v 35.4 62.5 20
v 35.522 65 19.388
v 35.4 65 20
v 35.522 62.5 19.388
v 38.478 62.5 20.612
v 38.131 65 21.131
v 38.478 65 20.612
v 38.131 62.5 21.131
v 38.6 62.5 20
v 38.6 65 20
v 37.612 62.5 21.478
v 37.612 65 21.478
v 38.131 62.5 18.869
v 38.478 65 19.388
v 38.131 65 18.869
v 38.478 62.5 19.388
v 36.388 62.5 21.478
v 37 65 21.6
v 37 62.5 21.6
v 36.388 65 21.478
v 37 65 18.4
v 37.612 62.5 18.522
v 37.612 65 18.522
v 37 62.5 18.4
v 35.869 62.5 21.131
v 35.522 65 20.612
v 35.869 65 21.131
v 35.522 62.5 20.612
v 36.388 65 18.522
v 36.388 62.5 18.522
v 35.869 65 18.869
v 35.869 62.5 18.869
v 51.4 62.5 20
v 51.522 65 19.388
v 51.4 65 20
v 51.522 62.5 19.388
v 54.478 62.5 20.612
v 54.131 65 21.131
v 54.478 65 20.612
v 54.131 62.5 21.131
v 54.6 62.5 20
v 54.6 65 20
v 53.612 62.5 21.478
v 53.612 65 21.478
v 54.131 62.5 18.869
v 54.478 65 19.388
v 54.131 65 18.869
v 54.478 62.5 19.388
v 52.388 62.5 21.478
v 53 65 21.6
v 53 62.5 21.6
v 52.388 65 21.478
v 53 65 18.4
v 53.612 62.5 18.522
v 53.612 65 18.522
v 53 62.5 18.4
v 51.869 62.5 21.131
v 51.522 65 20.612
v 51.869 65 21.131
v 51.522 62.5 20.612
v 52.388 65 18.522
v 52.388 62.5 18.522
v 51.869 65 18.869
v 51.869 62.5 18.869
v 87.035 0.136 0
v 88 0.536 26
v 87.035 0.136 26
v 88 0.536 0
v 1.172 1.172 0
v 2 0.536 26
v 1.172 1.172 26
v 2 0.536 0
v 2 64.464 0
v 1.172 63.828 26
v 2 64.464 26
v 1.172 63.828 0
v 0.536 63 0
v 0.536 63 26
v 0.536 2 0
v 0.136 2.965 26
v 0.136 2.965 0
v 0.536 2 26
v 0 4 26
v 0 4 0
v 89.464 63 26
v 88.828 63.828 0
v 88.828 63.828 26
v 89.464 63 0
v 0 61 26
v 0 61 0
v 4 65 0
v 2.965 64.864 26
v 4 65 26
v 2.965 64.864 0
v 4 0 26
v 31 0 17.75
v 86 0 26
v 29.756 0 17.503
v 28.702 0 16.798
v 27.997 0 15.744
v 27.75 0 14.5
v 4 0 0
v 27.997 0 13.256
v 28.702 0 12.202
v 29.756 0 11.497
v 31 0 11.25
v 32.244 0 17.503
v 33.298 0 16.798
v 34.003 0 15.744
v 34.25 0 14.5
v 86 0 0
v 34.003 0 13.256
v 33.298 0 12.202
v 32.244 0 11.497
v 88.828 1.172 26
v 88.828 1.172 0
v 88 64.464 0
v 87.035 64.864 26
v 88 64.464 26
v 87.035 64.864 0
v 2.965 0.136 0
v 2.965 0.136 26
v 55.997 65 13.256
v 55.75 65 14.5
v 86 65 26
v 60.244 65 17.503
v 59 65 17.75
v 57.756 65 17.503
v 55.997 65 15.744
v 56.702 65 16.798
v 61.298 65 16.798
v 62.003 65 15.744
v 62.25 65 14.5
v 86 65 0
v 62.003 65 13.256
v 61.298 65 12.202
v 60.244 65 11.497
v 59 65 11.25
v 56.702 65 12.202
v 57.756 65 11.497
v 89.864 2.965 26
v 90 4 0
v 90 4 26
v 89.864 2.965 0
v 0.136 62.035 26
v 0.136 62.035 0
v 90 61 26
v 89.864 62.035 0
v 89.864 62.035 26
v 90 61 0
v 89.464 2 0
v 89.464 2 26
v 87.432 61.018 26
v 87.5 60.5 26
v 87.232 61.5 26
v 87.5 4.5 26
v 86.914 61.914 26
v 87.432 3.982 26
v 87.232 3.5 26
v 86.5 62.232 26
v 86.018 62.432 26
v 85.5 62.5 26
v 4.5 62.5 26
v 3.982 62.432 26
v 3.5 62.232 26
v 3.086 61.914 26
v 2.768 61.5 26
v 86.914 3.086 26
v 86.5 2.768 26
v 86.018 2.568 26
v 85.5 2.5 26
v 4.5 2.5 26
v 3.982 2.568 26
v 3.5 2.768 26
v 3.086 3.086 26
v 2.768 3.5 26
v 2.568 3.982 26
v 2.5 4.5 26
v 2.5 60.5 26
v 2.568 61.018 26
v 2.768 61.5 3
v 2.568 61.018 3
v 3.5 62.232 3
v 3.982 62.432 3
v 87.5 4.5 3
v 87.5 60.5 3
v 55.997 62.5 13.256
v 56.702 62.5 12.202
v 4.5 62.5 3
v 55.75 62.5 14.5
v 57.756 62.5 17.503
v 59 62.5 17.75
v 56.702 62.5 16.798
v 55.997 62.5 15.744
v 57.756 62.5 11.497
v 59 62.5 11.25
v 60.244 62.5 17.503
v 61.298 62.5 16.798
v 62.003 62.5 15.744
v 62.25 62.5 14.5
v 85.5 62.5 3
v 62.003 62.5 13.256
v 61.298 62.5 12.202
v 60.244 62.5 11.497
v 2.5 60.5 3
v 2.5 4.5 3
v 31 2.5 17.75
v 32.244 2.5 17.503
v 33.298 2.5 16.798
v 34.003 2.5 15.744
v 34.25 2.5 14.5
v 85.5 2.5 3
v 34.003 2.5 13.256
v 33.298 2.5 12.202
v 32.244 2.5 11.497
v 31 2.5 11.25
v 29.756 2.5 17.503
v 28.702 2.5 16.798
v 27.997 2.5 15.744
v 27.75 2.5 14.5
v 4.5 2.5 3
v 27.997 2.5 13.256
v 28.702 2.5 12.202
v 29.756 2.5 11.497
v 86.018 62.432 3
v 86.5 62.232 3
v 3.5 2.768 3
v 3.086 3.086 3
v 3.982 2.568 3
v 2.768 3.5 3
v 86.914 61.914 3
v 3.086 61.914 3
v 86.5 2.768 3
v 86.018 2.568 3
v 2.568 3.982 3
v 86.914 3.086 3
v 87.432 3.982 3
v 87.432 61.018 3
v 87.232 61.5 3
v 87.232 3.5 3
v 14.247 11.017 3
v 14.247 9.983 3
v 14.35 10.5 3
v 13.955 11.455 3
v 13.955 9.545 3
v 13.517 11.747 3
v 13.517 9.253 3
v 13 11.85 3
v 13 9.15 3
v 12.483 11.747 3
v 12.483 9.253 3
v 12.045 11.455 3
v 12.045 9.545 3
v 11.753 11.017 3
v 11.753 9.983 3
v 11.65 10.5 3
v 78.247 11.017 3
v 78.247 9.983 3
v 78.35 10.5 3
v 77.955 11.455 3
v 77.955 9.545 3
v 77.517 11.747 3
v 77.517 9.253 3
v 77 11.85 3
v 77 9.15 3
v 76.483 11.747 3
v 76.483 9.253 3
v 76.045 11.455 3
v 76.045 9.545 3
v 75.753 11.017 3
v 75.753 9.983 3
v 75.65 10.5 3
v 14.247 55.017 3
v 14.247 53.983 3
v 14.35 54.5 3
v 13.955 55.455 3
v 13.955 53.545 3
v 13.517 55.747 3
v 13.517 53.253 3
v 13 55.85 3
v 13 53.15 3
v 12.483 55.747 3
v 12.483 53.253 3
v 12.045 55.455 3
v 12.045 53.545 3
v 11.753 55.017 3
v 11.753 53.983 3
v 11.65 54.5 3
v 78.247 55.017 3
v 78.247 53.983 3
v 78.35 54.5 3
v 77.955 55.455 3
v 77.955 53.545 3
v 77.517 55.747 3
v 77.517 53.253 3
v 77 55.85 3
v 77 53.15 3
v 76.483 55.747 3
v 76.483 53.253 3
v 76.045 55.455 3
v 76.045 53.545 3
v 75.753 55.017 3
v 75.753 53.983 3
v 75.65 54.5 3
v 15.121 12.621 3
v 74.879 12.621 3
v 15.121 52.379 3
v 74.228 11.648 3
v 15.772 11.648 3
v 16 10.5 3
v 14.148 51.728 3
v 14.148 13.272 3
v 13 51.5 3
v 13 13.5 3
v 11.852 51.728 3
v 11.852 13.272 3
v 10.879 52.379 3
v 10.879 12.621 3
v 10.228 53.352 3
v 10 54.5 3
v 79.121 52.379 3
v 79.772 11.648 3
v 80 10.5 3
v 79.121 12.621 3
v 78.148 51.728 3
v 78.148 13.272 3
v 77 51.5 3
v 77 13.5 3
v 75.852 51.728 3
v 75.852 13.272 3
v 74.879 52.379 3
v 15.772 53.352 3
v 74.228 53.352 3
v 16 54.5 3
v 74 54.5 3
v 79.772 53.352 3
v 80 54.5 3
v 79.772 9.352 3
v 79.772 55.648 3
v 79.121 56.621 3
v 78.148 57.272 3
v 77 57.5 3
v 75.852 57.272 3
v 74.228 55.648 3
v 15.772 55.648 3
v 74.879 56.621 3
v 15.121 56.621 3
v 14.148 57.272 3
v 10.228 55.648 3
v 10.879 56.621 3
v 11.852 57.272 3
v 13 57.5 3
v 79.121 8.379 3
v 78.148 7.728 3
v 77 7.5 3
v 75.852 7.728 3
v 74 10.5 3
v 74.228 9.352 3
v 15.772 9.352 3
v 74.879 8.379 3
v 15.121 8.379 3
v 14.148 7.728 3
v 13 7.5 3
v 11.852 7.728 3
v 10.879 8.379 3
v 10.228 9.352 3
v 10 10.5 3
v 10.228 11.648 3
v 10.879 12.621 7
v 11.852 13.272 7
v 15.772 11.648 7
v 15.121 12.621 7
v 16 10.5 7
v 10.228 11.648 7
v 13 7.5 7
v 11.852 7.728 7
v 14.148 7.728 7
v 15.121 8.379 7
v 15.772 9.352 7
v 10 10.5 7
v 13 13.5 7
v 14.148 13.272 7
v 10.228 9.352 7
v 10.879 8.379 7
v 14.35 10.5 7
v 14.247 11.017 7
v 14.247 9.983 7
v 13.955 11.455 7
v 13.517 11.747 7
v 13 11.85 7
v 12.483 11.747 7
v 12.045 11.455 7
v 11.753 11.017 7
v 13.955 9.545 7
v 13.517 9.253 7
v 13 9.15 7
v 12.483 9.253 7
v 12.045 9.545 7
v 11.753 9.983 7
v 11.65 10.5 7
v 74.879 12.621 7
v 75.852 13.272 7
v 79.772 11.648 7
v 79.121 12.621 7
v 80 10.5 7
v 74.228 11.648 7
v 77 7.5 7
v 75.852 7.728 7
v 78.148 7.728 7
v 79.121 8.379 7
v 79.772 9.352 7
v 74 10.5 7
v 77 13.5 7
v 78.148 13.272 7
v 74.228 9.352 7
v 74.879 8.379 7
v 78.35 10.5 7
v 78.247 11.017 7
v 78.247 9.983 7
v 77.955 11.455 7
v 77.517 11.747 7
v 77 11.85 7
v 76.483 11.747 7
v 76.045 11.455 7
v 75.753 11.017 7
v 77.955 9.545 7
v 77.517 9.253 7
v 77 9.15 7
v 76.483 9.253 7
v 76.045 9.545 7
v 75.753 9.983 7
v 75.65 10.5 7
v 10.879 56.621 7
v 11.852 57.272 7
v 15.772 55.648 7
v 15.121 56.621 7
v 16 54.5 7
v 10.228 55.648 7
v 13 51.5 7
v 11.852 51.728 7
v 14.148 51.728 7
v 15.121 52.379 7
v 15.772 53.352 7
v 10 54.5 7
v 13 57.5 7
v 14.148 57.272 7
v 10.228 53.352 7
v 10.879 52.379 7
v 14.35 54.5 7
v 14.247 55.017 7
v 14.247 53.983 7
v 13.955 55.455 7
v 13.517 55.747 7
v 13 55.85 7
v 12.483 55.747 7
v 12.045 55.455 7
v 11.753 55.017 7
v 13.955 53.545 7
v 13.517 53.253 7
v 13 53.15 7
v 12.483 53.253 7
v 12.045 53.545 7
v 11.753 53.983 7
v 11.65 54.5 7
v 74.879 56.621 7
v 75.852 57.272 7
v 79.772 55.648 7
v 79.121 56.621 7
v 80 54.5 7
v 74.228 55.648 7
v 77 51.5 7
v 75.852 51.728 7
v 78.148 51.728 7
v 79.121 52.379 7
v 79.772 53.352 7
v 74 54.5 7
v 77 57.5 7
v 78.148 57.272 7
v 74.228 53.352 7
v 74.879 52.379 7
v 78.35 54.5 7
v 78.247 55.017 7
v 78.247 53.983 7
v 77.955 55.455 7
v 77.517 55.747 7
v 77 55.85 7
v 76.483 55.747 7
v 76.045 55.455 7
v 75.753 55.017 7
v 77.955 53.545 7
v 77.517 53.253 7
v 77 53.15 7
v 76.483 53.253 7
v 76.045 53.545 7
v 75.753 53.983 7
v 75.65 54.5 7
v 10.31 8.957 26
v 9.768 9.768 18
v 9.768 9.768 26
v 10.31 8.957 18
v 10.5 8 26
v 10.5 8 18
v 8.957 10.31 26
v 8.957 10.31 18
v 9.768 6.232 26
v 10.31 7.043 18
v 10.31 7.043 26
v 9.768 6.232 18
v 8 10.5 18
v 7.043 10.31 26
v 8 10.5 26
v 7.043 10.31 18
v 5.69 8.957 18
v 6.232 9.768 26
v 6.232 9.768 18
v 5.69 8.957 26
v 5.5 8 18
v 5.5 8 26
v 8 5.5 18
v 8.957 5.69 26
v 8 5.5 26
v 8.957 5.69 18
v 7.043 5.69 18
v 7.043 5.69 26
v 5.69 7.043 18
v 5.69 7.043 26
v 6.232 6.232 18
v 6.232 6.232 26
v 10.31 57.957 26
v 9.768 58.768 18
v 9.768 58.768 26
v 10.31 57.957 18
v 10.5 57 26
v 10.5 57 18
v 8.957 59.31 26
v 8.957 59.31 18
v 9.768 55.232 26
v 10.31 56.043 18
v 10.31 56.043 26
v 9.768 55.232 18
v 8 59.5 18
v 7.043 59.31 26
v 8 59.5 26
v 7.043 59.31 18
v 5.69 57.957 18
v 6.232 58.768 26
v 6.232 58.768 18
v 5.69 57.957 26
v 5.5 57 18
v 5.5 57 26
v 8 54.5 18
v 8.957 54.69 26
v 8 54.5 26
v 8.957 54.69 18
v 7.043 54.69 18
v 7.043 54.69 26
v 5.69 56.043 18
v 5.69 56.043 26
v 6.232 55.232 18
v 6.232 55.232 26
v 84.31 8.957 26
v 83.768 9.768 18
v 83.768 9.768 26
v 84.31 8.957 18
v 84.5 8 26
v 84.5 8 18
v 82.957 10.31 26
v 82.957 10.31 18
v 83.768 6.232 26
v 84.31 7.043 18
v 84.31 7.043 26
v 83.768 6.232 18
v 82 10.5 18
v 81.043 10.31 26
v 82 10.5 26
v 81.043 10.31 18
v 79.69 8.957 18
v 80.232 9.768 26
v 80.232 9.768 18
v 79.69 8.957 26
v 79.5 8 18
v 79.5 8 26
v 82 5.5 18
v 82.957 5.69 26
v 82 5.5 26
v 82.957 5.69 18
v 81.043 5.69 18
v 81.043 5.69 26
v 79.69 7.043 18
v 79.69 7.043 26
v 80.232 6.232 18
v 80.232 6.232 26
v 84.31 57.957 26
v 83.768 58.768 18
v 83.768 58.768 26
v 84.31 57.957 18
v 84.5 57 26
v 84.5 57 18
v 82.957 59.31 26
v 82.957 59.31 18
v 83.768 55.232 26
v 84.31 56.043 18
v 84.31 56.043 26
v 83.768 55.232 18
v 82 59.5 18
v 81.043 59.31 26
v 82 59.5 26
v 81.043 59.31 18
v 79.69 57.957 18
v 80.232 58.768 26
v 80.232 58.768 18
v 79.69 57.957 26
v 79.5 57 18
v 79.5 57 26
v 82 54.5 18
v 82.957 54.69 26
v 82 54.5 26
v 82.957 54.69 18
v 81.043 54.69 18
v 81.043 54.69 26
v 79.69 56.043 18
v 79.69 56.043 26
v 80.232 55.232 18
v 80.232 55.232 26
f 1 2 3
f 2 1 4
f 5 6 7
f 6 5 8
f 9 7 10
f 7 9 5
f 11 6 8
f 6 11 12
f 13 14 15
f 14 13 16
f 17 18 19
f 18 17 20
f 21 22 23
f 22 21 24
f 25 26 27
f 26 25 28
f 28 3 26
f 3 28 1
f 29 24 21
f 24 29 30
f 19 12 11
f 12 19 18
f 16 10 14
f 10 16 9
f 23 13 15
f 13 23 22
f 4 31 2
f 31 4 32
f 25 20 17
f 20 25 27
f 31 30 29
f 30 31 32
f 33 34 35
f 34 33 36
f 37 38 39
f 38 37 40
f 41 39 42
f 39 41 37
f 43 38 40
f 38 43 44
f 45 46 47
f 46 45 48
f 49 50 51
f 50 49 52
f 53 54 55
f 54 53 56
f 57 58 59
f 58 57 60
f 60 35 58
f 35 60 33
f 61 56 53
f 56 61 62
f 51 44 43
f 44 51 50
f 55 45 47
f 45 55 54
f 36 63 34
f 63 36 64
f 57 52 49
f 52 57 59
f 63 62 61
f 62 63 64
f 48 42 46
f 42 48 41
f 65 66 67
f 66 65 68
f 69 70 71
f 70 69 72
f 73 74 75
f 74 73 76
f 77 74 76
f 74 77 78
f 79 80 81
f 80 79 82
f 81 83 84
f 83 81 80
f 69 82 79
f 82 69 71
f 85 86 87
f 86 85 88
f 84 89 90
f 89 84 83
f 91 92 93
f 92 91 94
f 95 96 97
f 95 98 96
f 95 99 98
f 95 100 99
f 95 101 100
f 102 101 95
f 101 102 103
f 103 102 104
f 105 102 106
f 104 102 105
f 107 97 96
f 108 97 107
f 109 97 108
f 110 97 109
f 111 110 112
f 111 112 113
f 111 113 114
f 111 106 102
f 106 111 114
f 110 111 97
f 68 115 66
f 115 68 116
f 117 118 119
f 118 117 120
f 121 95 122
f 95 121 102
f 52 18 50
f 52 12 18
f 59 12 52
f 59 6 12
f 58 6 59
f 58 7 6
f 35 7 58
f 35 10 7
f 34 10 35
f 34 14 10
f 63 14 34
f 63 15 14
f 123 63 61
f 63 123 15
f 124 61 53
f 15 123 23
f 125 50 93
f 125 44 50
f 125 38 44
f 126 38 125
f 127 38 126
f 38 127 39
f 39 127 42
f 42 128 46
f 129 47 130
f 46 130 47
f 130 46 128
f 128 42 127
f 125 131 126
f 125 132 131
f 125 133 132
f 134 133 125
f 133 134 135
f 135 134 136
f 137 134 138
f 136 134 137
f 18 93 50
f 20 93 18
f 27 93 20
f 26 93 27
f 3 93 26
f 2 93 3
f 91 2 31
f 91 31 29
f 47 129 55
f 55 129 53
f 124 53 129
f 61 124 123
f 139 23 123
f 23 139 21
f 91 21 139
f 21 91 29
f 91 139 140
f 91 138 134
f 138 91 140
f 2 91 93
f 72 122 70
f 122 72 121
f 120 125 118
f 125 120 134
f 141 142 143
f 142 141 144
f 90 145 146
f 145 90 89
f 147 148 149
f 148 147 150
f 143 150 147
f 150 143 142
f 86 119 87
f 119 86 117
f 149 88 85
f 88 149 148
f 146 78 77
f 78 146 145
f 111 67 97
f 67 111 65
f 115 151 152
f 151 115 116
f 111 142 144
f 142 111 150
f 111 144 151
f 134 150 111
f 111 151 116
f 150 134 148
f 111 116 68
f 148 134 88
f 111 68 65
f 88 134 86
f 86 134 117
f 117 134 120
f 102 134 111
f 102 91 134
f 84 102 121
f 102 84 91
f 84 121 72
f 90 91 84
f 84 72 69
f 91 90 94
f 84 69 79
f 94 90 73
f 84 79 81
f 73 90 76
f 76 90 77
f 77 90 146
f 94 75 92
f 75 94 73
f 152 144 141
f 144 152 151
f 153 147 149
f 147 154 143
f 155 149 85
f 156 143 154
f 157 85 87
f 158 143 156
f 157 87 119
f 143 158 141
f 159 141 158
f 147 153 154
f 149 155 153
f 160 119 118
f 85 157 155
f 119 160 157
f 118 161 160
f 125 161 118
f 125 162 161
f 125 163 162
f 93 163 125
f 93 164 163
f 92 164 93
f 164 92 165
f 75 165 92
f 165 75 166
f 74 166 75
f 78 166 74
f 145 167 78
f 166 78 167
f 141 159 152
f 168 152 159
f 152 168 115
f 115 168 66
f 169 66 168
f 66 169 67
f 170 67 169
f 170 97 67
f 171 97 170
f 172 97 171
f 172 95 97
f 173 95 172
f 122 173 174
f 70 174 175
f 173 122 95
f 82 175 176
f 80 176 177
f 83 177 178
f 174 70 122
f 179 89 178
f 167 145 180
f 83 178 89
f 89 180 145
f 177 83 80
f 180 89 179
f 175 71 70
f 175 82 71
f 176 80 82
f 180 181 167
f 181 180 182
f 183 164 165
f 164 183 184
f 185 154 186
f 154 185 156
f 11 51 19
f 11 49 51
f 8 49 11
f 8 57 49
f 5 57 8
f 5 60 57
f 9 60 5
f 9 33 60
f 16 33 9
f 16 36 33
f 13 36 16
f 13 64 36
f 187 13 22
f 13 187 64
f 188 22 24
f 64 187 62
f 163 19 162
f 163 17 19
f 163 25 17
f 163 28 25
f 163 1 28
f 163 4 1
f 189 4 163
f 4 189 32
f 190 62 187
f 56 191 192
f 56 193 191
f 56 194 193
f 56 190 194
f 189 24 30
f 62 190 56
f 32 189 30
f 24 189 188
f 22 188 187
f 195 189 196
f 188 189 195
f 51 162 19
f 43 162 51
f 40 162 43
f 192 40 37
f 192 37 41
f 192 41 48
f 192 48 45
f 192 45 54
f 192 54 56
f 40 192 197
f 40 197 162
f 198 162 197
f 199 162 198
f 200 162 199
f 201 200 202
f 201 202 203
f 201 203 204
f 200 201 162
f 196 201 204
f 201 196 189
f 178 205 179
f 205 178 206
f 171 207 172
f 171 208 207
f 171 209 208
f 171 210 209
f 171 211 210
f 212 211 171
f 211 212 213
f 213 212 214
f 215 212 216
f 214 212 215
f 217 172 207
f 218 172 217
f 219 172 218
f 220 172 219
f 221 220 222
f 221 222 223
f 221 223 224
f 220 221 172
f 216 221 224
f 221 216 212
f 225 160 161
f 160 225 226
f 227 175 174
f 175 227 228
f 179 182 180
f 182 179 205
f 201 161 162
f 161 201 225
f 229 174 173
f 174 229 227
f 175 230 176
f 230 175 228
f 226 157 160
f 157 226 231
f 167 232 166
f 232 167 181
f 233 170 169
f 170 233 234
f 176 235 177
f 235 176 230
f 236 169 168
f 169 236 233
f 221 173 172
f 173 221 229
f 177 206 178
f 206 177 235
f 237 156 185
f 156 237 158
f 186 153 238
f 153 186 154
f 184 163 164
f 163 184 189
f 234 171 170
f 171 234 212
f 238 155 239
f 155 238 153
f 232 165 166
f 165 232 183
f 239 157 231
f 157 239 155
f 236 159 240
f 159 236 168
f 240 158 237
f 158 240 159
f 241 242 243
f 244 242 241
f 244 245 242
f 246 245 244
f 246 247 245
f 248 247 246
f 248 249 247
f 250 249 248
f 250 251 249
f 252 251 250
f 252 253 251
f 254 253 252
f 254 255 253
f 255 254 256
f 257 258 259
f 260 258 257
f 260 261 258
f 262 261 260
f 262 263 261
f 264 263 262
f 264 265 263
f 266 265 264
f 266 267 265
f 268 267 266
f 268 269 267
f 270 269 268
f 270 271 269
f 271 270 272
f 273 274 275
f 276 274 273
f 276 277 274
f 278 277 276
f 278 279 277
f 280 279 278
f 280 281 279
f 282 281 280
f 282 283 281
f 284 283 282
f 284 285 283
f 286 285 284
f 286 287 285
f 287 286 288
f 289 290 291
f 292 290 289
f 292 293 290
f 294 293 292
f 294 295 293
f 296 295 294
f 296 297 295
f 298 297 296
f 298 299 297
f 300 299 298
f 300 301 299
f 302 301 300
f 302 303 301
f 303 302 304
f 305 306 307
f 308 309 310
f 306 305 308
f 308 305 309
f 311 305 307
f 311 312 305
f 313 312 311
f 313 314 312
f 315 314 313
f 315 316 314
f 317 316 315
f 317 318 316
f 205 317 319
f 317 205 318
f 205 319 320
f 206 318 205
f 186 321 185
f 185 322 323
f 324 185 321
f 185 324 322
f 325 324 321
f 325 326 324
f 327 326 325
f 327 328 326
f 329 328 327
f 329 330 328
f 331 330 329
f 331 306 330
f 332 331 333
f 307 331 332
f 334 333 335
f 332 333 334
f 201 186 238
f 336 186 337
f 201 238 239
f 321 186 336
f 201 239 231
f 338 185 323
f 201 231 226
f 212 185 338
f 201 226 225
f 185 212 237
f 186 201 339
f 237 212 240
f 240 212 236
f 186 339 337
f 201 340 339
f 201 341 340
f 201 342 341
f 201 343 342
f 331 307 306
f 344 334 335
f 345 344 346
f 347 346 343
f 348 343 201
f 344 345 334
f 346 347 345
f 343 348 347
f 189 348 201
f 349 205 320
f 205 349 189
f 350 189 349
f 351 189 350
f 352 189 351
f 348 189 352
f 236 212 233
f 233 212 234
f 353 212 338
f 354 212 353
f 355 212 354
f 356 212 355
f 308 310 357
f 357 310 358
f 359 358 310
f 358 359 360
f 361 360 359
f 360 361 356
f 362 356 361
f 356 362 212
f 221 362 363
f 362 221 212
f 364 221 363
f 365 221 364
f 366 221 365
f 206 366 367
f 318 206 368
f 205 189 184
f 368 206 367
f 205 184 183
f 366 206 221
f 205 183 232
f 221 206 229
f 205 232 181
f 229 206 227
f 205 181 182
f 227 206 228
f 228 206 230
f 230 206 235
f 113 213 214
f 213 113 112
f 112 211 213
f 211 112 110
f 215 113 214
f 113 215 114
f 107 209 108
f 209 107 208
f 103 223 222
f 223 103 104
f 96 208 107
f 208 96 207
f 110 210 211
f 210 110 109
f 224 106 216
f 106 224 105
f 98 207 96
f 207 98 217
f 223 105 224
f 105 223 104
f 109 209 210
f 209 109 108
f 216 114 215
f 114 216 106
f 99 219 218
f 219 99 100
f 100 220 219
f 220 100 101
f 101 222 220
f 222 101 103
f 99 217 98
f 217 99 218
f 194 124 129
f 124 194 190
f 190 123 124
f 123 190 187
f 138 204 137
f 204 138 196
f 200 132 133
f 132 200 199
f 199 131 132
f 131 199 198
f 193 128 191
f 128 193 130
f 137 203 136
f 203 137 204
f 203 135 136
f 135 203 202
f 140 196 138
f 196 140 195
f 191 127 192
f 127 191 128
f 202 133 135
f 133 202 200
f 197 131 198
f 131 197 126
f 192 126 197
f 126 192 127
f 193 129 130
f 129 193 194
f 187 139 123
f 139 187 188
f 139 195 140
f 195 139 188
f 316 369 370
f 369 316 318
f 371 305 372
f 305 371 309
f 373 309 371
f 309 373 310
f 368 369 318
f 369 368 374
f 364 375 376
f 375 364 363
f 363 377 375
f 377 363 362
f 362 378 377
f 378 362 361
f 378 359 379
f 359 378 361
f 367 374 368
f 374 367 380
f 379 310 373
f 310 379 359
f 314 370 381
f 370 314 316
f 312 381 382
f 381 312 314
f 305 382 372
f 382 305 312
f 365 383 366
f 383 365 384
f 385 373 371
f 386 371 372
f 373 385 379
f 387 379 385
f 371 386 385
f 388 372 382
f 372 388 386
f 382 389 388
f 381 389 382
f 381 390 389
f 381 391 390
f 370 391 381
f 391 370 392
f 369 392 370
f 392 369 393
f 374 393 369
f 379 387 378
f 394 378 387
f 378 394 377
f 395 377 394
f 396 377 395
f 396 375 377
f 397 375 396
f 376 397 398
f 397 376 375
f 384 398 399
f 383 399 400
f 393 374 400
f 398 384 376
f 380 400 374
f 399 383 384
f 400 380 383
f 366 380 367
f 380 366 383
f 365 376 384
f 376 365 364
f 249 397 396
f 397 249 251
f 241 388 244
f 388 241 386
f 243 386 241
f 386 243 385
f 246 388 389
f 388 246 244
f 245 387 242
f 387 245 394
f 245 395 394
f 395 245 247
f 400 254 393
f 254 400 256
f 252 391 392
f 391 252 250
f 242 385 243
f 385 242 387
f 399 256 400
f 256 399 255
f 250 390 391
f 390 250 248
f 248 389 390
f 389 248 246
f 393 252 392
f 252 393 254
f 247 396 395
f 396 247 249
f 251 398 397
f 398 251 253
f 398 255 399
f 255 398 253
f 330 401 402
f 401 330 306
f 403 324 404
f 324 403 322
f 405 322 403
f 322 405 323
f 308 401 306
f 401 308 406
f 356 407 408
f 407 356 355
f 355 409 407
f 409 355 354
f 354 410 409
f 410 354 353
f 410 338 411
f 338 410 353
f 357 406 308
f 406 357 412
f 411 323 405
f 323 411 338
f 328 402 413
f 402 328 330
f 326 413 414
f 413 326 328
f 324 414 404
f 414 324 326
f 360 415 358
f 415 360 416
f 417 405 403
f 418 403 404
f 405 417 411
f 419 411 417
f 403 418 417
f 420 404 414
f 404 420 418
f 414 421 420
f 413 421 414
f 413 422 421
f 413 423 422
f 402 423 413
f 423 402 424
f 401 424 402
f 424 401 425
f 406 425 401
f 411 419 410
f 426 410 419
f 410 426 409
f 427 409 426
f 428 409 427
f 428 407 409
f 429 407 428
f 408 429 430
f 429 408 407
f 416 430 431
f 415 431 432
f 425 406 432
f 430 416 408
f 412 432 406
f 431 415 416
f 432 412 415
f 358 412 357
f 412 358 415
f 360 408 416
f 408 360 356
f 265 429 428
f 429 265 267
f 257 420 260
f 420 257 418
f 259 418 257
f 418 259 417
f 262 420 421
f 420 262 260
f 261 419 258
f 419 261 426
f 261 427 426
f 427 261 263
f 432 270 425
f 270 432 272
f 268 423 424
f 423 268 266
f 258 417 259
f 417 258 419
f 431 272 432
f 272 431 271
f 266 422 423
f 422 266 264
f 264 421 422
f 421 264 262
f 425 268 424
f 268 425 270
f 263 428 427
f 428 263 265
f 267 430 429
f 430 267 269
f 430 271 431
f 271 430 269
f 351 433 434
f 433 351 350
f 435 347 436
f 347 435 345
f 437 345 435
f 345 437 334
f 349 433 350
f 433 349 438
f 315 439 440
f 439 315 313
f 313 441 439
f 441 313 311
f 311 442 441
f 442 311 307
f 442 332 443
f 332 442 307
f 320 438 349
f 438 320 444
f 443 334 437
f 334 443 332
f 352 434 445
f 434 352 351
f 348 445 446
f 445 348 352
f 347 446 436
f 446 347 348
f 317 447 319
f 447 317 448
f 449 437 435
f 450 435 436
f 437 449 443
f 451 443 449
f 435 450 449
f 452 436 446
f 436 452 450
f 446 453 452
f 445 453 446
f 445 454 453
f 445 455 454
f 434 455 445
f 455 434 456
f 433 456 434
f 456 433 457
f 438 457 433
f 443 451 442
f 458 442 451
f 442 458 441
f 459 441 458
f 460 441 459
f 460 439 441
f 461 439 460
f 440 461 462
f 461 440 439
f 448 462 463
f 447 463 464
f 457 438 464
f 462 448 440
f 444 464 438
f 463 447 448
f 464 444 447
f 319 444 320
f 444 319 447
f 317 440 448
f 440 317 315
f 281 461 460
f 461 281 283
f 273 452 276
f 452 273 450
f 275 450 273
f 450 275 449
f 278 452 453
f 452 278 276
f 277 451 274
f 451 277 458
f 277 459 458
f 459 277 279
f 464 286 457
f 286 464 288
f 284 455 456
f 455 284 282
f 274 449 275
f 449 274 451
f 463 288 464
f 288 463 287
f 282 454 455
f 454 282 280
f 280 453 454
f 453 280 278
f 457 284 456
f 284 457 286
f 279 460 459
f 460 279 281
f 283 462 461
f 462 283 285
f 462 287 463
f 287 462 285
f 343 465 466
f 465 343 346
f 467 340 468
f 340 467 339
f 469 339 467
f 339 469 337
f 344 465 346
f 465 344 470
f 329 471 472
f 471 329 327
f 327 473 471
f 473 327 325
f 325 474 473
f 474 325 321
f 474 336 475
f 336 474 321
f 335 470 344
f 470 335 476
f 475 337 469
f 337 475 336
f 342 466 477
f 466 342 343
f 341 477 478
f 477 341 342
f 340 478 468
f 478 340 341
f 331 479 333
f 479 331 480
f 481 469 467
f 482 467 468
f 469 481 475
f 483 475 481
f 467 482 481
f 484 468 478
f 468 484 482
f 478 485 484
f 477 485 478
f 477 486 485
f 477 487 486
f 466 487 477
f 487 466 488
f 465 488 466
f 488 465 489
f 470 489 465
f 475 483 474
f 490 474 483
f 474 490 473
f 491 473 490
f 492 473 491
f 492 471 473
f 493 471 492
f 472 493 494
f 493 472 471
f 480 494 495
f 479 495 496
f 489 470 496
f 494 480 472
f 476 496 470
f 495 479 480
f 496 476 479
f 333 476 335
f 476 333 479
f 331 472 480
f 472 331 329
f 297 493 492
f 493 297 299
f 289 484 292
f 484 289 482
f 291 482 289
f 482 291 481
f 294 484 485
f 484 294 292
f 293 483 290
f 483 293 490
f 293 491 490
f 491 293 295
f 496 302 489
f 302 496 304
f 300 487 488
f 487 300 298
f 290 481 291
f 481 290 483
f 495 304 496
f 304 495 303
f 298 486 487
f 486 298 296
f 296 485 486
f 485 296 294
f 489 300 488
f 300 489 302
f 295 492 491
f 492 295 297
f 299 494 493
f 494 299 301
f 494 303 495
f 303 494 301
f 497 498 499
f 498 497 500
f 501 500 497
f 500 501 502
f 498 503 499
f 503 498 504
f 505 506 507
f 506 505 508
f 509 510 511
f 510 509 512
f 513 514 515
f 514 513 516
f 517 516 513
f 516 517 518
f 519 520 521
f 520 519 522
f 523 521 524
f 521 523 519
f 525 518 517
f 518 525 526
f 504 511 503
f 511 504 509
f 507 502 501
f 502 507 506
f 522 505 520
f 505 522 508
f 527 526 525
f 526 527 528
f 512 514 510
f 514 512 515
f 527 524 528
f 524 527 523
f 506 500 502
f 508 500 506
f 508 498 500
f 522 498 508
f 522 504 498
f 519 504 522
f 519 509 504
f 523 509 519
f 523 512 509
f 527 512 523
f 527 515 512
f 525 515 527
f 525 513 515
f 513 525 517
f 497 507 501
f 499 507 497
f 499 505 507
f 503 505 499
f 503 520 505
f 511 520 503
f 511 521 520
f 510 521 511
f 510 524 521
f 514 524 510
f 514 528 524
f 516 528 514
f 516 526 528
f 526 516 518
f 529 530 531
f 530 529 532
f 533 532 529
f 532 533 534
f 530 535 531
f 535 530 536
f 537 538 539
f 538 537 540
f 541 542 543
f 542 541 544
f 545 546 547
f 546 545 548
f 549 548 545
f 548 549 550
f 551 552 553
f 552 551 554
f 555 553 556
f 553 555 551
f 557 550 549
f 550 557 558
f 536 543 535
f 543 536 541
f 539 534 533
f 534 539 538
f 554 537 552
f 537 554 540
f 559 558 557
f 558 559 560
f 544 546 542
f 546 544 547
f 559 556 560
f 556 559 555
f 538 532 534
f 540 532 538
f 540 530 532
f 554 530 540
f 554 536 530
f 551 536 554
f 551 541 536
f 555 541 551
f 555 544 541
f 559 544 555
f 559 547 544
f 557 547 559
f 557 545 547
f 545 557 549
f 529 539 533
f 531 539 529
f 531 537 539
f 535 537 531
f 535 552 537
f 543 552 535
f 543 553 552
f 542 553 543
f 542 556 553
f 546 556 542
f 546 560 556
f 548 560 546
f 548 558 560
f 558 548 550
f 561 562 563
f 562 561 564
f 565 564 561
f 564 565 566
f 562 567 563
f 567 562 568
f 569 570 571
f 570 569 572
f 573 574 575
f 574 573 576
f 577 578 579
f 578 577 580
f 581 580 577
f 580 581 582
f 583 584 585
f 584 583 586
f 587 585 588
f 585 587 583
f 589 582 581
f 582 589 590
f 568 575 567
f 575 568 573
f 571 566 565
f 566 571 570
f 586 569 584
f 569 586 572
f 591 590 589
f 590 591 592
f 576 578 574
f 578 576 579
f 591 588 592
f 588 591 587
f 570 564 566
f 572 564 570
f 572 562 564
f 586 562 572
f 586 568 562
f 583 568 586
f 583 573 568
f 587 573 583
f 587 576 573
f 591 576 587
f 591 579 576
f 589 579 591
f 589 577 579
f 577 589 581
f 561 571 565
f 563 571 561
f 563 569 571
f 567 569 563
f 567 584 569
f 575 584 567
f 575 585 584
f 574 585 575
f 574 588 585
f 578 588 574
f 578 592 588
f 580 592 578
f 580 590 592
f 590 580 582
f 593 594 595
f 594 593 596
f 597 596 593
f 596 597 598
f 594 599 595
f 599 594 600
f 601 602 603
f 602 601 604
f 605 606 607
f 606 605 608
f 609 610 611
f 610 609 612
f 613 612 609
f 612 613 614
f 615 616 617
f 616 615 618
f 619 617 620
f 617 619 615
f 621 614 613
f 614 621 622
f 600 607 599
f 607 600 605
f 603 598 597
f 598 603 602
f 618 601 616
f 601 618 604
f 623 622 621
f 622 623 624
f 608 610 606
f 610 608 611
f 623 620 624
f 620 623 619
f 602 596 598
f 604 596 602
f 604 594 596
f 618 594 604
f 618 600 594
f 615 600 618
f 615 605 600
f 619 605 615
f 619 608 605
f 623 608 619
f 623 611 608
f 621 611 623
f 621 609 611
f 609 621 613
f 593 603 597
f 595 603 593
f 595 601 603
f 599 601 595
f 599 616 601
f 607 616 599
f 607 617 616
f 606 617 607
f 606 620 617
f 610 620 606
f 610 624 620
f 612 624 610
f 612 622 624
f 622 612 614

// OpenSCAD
/**
 * upconverter_box.scad — TM-SDR-ENC-001 Rev A
 * RF-Shielded Enclosure for HF Upconverter + Direct Sampling Interface
 *
 * Features:
 *   - Two-piece clamshell (body + lid), snap-fit + M2.5 screws
 *   - Inner copper-foil shielding cavity (print with foil lining)
 *   - SMA IN (rear) and SMA OUT (front)
 *   - USB Micro-B power connector (side)
 *   - LED indicator holes
 *   - PCB standoffs for 70×50 mm PCB
 *
 * Envelope: 90×65×36 mm (fits in 200×200×200 build volume)
 * Material: PETG + copper tape lining inside for RF shielding
 */

// ── Parameters ─────────────────────────────────────────────────────────────
box_w   = 90.0;    // X
box_d   = 65.0;    // Y
box_h   = 36.0;    // Z total
wall    = 2.5;     // wall thickness
floor_h = 3.0;     // floor thickness
lid_h   = 10.0;    // lid height (includes overlap flange)
body_h  = box_h - lid_h;  // body height

// PCB
pcb_w  = 70.0;
pcb_d  = 50.0;
pcb_stoff_h = 4.0;   // PCB standoff height
pcb_stoff_d = 6.0;   // standoff outer dia
pcb_hole_d  = 2.7;   // M2.5 clearance

// Connectors
sma_hole_d  = 6.5;   // SMA edge connector hole
usb_w       = 9.0;   // USB Micro-B opening width
usb_h       = 4.5;   // USB Micro-B opening height
led_d       = 3.2;   // 3mm LED hole

// Corner radius
r = 4.0;

// Lid flange
flange_depth = 3.0;   // how deep lid flange goes into body
flange_wall  = 1.5;   // flange wall thickness

// Shielding cavity (slightly smaller than interior)
shield_offset = 0.6;  // gap for copper tape

// Screw holes at lid corners
screw_d    = 2.7;     // M2.5 through
screw_boss = 5.0;     // boss diameter

$fn = 32;

// ── Utility ────────────────────────────────────────────────────────────────
module rounded_box(w, d, h, r_) {
    hull()
        for (x=[r_, w-r_]) for (y=[r_, d-r_])
            translate([x, y, 0]) cylinder(h=h, r=r_, $fn=24);
}

module standoff(x, y, h, od, id) {
    translate([x, y, floor_h])
        difference() {
            cylinder(h=h, d=od, $fn=16);
            translate([0,0,-0.5]) cylinder(h=h+1, d=id, $fn=16);
        }
}

// ── Body ────────────────────────────────────────────────────────────────────
module body() {
    difference() {
        // Outer shell
        rounded_box(box_w, box_d, body_h, r);

        // Inner cavity
        translate([wall, wall, floor_h])
            rounded_box(box_w-2*wall, box_d-2*wall, body_h, r-wall+0.5);

        // ── SMA IN: rear face, center height, left of center ──────────
        translate([box_w/2 - 14, -0.5, body_h/2 + floor_h/2])
        rotate([-90, 0, 0])
            cylinder(h=wall+1, d=sma_hole_d, $fn=16);

        // ── SMA OUT: front face, center height, right of center ────────
        translate([box_w/2 + 14, box_d+0.5, body_h/2 + floor_h/2])
        rotate([90, 0, 0])
            cylinder(h=wall+1, d=sma_hole_d, $fn=16);

        // ── USB Micro-B: right side, near bottom ───────────────────────
        translate([box_w+0.5, box_d/2 - usb_w/2, floor_h + 2])
        rotate([0, 90, 0])
            cube([usb_h, usb_w, wall+1]);

        // ── LED holes: front face ──────────────────────────────────────
        for (x=[box_w/2 - 8, box_w/2 + 8])
            translate([x, box_d+0.5, body_h - 6])
            rotate([90,0,0])
                cylinder(h=wall+1, d=led_d, $fn=16);

        // ── Lid screw bosses: countersunk from top ─────────────────────
        for (x=[8, box_w-8]) for (y=[8, box_d-8])
            translate([x, y, body_h - 5])
                cylinder(h=6, d=screw_d, $fn=16);
    }

    // PCB standoffs
    // Center PCB in box: offsets = (box_w - pcb_w)/2, (box_d - pcb_d)/2
    pcb_ox = (box_w - pcb_w) / 2;
    pcb_oy = (box_d - pcb_d) / 2;
    standoff(pcb_ox + 3,        pcb_oy + 3,        pcb_stoff_h, pcb_stoff_d, pcb_hole_d);
    standoff(pcb_ox + pcb_w-3,  pcb_oy + 3,        pcb_stoff_h, pcb_stoff_d, pcb_hole_d);
    standoff(pcb_ox + 3,        pcb_oy + pcb_d-3,  pcb_stoff_h, pcb_stoff_d, pcb_hole_d);
    standoff(pcb_ox + pcb_w-3,  pcb_oy + pcb_d-3,  pcb_stoff_h, pcb_stoff_d, pcb_hole_d);

    // Screw bosses at corners (inside body, below lid flange)
    for (x=[8, box_w-8]) for (y=[8, box_d-8])
        translate([x, y, body_h - 8])
            cylinder(h=8, d=screw_boss, $fn=16);
}

// ── Lid ─────────────────────────────────────────────────────────────────────
module lid() {
    difference() {
        union() {
            // Top plate
            rounded_box(box_w, box_d, lid_h - flange_depth, r);

            // Flange (snaps inside body opening)
            translate([wall + flange_wall + shield_offset,
                       wall + flange_wall + shield_offset,
                       lid_h - flange_depth])
                rounded_box(
                    box_w - 2*(wall + flange_wall + shield_offset),
                    box_d - 2*(wall + flange_wall + shield_offset),
                    flange_depth, r - wall);
        }

        // Screw through holes at corners
        for (x=[8, box_w-8]) for (y=[8, box_d-8])
            translate([x, y, -0.5])
                cylinder(h=lid_h+1, d=screw_d, $fn=16);

        // Vent slot (center of lid) — optional
        translate([box_w/2 - 15, box_d/2 - 3, -0.5])
            cube([30, 6, lid_h - flange_depth + 1]);
    }
}

// ── Shielding note ─────────────────────────────────────────────────────────
// After printing:
// 1. Cut copper tape to fit inner walls (4 sides + floor + lid inside).
// 2. Overlap tape corners for continuous shield.
// 3. Solder or conductive-epoxy tape seams.
// 4. Verify conductivity with multimeter across seams.
// 5. PCB ground plane should contact bottom copper tape via spring fingers
//    or M2.5 standoff screws (body standoffs are grounded via PCB GND plane).

// ── Render ─────────────────────────────────────────────────────────────────
print_part = "body";  // "body" | "lid" | "both"

if (print_part == "body") {
    color("lightblue", 0.9) body();
} else if (print_part == "lid") {
    color("steelblue", 0.9) lid();
} else {
    color("lightblue", 0.9) body();
    color("steelblue", 0.7)
    translate([0, 0, body_h]) lid();
}
